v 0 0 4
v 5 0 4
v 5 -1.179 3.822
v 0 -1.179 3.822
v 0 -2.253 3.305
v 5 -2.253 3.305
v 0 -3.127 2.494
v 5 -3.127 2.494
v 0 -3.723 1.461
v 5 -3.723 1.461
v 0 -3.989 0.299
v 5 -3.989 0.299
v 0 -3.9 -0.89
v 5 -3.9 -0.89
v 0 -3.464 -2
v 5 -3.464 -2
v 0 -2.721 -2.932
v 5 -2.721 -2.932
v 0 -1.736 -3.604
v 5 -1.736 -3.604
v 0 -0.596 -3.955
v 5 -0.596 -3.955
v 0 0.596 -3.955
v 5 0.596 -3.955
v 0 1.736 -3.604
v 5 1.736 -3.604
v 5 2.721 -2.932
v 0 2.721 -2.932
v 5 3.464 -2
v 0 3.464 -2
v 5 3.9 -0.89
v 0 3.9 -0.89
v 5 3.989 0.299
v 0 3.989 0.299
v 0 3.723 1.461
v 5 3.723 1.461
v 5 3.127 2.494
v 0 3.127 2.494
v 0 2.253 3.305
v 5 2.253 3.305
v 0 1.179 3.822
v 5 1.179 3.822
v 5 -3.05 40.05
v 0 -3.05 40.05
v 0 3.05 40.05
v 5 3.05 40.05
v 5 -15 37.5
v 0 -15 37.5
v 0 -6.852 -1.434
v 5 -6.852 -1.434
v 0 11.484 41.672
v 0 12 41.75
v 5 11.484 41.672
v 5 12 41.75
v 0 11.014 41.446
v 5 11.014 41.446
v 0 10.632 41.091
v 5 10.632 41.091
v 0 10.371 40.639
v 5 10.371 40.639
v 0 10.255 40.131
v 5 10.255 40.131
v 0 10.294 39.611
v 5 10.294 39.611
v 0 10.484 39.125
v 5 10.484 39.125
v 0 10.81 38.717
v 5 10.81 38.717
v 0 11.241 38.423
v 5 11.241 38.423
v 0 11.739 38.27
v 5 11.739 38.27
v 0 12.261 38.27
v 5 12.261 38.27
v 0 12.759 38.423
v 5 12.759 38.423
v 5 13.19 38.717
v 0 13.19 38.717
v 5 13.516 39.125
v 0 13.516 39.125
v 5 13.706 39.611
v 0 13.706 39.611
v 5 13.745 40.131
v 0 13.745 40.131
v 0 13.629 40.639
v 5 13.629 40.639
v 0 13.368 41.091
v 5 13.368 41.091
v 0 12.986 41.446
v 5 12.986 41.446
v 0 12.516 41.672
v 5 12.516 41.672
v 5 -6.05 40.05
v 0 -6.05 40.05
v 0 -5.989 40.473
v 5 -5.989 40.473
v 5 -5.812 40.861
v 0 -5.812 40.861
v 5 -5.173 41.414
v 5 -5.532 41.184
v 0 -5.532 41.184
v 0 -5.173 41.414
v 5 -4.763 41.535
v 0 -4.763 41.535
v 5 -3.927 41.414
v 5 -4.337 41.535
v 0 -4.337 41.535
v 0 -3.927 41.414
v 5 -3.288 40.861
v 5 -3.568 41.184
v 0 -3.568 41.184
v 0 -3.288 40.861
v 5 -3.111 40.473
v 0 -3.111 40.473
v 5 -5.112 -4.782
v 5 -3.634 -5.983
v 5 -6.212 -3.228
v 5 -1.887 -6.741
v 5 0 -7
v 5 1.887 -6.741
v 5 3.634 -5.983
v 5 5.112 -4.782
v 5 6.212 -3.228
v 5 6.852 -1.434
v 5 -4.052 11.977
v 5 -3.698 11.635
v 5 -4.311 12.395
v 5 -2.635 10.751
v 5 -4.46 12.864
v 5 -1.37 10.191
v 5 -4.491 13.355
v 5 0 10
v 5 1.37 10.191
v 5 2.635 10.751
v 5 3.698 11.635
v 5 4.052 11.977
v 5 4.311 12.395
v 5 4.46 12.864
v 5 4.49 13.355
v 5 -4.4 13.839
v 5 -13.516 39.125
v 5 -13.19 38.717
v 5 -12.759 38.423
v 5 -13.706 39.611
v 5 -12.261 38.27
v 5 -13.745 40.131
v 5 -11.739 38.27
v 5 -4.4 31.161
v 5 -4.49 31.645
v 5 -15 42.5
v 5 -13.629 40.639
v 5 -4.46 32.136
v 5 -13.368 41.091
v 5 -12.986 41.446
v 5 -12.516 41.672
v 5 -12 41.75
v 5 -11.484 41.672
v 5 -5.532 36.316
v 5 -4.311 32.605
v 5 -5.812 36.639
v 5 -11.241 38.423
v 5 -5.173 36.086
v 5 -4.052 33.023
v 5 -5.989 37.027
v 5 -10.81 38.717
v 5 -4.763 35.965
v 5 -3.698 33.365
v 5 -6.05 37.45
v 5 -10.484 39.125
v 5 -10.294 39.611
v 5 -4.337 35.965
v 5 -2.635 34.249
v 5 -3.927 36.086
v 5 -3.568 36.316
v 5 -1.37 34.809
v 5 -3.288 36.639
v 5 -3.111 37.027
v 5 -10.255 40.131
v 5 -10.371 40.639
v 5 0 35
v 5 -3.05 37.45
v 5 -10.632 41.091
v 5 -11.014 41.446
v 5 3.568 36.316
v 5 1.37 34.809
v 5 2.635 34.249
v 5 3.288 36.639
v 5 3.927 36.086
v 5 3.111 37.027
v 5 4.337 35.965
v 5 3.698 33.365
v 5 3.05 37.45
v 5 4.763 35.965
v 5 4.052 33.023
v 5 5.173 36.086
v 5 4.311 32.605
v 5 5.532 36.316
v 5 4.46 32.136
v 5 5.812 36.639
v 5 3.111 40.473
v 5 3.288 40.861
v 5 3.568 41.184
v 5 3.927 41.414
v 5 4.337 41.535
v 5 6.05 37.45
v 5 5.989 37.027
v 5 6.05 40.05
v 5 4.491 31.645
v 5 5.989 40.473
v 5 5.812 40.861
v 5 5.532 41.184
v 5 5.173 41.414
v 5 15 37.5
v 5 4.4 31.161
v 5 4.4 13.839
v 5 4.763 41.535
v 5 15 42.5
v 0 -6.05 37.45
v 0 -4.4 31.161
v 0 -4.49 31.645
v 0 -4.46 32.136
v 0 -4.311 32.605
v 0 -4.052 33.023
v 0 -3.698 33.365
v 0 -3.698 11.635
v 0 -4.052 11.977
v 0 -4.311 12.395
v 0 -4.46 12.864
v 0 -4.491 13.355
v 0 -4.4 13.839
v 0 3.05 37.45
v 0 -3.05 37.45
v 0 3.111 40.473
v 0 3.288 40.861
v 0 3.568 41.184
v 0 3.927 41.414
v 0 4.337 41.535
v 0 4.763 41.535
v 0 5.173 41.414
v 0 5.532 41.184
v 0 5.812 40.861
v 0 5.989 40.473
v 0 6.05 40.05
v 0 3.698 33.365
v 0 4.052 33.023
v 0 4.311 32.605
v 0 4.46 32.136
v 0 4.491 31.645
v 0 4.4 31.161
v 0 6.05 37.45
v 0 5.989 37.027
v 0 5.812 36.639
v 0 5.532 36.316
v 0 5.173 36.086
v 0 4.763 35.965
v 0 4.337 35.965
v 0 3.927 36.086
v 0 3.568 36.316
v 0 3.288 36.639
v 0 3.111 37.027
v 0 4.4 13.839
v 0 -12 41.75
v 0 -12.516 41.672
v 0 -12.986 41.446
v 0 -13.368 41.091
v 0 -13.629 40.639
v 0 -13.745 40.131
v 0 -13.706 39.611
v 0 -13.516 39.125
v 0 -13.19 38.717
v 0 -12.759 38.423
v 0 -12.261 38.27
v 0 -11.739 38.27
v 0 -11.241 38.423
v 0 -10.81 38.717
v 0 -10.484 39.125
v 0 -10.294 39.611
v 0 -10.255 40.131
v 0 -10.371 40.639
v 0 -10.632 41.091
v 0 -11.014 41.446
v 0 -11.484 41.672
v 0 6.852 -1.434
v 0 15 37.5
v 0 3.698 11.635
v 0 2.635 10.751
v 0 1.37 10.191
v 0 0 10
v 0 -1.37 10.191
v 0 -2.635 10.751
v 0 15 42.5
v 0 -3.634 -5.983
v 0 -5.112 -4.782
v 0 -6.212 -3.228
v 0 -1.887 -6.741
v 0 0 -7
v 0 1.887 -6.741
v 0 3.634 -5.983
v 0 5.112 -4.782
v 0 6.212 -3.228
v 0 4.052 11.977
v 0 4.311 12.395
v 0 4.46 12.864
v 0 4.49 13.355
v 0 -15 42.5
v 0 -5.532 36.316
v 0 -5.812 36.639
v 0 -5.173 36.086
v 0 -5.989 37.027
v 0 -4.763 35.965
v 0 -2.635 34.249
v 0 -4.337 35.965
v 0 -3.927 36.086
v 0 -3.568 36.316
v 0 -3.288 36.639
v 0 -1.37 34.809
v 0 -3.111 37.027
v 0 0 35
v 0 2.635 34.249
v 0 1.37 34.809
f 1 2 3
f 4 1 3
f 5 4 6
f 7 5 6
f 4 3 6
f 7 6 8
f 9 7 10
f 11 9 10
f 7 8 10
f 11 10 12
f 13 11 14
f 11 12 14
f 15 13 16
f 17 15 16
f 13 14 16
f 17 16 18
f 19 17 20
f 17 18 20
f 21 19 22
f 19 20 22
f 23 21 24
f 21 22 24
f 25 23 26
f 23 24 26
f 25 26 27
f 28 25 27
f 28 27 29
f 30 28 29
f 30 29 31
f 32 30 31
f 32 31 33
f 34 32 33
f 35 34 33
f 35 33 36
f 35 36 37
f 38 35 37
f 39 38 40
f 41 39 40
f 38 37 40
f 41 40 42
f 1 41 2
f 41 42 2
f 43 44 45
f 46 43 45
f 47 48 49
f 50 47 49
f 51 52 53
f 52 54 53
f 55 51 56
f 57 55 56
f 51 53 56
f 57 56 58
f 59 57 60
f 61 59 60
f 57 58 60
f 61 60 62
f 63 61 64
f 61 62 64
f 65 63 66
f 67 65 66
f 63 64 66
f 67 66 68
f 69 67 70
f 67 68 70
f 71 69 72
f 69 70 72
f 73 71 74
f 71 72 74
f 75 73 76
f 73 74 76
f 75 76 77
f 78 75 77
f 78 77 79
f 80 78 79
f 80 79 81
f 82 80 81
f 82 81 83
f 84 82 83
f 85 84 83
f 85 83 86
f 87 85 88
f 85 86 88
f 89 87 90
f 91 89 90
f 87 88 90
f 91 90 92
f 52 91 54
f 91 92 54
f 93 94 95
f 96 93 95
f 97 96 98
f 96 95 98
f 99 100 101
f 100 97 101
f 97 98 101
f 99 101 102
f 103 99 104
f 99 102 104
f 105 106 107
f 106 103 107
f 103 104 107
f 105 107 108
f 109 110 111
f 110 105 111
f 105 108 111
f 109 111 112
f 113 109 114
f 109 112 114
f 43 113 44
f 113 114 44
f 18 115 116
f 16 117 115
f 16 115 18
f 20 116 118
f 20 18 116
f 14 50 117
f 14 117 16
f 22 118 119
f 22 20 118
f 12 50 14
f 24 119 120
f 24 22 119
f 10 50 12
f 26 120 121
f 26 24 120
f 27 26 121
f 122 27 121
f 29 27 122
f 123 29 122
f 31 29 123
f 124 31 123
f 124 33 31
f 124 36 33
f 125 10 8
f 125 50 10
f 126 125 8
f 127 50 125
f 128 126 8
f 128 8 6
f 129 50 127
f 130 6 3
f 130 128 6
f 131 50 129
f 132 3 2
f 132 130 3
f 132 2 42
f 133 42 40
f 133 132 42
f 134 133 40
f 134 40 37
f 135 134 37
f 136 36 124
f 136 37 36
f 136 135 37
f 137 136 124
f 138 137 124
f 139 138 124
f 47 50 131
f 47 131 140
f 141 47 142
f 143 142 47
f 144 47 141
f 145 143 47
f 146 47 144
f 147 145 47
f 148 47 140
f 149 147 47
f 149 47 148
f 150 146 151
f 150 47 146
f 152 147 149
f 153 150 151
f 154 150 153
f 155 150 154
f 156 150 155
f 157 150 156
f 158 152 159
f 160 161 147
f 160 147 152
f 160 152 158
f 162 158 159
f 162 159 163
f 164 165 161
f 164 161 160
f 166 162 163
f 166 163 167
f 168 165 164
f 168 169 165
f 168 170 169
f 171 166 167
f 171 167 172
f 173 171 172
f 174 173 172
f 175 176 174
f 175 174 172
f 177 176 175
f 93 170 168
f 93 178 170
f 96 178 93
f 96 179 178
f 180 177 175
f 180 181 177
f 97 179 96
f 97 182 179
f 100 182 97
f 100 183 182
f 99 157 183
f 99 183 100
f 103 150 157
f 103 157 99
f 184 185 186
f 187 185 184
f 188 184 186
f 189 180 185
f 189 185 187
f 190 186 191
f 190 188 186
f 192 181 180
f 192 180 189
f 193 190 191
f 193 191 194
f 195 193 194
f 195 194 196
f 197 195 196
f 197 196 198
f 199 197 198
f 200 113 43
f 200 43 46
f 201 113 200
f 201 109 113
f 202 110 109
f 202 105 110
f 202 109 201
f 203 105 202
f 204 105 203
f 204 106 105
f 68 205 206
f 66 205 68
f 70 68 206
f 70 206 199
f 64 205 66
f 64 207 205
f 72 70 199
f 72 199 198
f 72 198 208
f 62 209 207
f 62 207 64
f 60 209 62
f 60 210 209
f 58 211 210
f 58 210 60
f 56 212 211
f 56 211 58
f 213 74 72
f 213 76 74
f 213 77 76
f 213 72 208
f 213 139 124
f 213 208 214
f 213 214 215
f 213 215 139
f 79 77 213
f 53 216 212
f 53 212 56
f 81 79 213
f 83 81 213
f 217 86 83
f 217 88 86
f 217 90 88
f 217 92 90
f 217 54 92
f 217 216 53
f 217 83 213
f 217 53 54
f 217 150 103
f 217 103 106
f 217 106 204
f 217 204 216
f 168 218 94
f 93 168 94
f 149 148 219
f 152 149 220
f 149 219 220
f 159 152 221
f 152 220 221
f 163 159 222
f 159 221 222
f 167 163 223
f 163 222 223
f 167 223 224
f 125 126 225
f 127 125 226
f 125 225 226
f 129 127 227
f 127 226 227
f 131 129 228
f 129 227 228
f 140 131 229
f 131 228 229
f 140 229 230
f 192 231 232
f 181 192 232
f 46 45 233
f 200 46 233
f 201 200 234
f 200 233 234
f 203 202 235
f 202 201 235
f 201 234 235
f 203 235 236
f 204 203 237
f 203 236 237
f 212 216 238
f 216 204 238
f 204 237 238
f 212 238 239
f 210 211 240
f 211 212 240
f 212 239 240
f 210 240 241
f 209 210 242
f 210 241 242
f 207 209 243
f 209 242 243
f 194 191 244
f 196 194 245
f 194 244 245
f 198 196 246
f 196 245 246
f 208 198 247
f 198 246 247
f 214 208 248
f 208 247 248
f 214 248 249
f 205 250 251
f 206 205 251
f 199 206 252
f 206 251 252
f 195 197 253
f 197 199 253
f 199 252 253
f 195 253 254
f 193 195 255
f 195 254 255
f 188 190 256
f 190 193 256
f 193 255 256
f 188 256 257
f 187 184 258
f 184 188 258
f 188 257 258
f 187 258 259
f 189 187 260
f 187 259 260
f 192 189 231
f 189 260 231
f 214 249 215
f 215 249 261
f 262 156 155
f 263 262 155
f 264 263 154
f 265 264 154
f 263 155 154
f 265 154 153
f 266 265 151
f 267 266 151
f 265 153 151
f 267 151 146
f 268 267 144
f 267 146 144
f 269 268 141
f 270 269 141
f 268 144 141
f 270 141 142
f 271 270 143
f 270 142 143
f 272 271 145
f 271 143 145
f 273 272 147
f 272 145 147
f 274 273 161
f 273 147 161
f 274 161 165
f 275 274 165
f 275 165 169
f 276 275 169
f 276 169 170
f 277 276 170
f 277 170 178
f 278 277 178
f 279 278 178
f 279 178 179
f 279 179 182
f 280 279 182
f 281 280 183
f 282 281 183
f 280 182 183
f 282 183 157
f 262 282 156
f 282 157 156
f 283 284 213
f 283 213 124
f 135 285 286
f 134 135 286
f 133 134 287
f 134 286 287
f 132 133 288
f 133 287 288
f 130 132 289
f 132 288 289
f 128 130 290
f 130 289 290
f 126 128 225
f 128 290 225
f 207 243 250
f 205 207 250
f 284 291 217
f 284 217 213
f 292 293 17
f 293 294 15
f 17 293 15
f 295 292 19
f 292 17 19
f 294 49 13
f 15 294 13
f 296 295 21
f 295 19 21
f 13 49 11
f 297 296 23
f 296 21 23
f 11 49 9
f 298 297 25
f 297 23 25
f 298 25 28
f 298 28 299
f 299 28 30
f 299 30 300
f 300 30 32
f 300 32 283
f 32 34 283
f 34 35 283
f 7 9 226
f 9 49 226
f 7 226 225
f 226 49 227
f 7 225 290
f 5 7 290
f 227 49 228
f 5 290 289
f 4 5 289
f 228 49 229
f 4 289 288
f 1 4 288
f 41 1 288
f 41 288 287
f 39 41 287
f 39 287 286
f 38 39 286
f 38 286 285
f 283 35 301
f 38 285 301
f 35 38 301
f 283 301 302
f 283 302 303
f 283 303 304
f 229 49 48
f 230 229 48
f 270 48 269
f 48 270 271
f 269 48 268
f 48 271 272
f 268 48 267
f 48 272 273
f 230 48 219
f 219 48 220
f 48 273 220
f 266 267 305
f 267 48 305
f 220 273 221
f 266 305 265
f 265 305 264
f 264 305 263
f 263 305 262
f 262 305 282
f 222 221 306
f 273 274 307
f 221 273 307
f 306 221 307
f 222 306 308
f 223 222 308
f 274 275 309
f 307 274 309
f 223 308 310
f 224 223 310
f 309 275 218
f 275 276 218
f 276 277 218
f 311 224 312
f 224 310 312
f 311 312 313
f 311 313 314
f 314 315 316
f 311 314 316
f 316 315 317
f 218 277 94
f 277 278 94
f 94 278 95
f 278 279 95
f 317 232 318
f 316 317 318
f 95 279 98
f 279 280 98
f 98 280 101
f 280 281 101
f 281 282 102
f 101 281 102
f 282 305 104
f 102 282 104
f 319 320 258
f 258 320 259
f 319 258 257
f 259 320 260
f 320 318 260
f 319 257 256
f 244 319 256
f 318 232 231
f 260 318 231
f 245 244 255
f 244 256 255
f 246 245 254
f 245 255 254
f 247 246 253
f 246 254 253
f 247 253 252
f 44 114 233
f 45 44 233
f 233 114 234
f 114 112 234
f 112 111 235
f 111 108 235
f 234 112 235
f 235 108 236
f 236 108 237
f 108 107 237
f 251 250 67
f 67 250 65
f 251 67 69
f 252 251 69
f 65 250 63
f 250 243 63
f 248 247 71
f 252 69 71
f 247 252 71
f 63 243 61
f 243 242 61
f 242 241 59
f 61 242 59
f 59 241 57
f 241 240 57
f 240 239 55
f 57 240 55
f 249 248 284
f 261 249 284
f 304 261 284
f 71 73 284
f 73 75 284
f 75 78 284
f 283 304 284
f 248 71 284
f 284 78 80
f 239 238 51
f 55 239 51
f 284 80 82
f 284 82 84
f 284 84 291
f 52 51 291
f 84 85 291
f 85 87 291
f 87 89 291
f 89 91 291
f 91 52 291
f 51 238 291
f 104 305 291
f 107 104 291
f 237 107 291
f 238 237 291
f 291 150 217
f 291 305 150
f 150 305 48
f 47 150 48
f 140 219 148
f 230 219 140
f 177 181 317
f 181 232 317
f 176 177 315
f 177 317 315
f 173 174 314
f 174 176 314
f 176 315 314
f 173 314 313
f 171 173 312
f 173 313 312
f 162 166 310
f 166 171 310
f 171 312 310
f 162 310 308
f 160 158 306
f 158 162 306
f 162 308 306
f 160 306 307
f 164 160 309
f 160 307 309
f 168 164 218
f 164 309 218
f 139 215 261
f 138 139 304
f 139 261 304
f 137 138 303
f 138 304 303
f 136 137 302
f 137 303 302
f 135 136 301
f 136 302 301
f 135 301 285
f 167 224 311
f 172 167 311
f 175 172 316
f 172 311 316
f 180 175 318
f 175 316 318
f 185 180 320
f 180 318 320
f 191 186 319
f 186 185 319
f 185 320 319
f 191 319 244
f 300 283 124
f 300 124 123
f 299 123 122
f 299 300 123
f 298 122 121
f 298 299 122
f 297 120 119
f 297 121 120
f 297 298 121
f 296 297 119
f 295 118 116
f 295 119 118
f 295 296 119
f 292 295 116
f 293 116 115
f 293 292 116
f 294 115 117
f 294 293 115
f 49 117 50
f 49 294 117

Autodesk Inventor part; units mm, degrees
ref_plane "YZ Plane" through (0, 0, 0) normal (1, 0, 0) x (0, 1, 0)
ref_plane "XZ Plane" through (0, 0, 0) normal (0, 1, 0) x (-1, 0, 0)
ref_plane "XY Plane" through (0, 0, 0) normal (0, 0, 1) x (1, 0, 0)
sketch "Sketch1" plane through (0, 0, 0) normal (1, 0, 0) x (0, 1, 0)
  line L0 (-15, 42.5) -> (15, 42.5)
  line L1 (15, 42.5) -> (15, 37.5)
  line L2 (15, 37.5) -> (6.8516, -1.434)
  arc A0 (-6.8516, -1.434) -> (6.8516, -1.434) centre (0, 0) ccw
  line L3 (0, 0) -> (0, 42.5) construction
  line L4 (-15, 42.5) -> (-15, 37.5)
  line L5 (-15, 37.5) -> (-6.8516, -1.434)
  line L6 (-15, 40) -> (15, 40) construction
  arc A1 (4.4, 32.3749) -> (-4.4, 32.3749) centre (0, 30) ccw
  line L7 (-4.4, 32.3749) -> (-4.4, 12.6251)
  line L8 (-4.4, 22.5) -> (4.4, 22.5) construction
  line L9 (4.4, 32.3749) -> (4.4, 12.6251)
  arc A2 (-4.4, 12.6251) -> (4.4, 12.6251) centre (0, 15) ccw
  circle A3 centre (0, 15) radius 15 construction
  line L10 (0, 0) -> (12.9904, 7.5) construction
  line L11 (12.9904, 7.5) -> (25.9808, 15) construction
  line L12 (6, 37.5) -> (-6, 37.5) construction
  line L13 (-6, 37.5) -> (-6, 40) construction
  line L14 (-6, 40) -> (6, 40) construction
  line L15 (6, 40) -> (6, 37.5) construction
  line L16 (6, 37.5) -> (-6, 40) construction
  line L17 (-6, 37.5) -> (6, 40) construction
  arc A4 (4.4, 31.1611) -> (3.6981, 33.3651) centre (2.4943, 31.768) ccw
  arc A5 (-3.6981, 33.3651) -> (-4.4, 31.1611) centre (-2.4943, 31.768) ccw
  arc A6 (3.6981, 11.6349) -> (4.4, 13.8389) centre (2.4943, 13.232) ccw
  arc A7 (-4.4, 13.8389) -> (-3.6981, 11.6349) centre (-2.4943, 13.232) ccw
  circle A8 centre (0, 0) radius 4 construction
  line L18 (6.05, 37.45) -> (-6.05, 37.45)
  line L19 (-6.05, 37.45) -> (-6.05, 40.05)
  line L20 (-6.05, 40.05) -> (6.05, 40.05)
  line L21 (6.05, 40.05) -> (6.05, 37.45)
  line L22 (6.05, 37.45) -> (-6.05, 40.05) construction
  line L23 (-6.05, 37.45) -> (6.05, 40.05) construction
  line L24 (-6.05, 38.75) -> (6.05, 38.75)
  arc A9 (6.05, 40.05) -> (3.05, 40.05) centre (4.55, 40.05) ccw
  arc A10 (3.05, 37.45) -> (6.05, 37.45) centre (4.55, 37.45) ccw
  arc A11 (-3.05, 40.05) -> (-6.05, 40.05) centre (-4.55, 40.05) ccw
  arc A12 (-6.05, 37.45) -> (-3.05, 37.45) centre (-4.55, 37.45) ccw
  circle A13 centre (0, 0) radius 30 construction
  point P0 (-12, 40)
  point P1 (12, 40)
  point P2 (0, 38.75)
  point P3 (-3.6981, 11.6349)
  point P4 (-4.4, 13.8389)
  point P5 (-4.4, 31.1611)
  point P6 (-3.6981, 33.3651)
  point P7 (4.4, 13.8389)
  point P8 (3.6981, 11.6349)
  point P9 (-3.05, 37.45)
  point P10 (-3.05, 40.05)
  point P11 (3.05, 37.45)
  dimension "d0" = 14
  dimension "d1" = 5
  dimension "d3" = 30
  dimension "d4" = 5
  dimension "d5" = 8.8
  dimension "d6" = 15
  dimension "d7" = 60
  dimension "d8" = 15
  dimension "d11" = 24
  dimension "d12" = 12
  dimension "d14" = 2
  dimension "d31" = 8
  dimension "d34" = 1.5
  dimension "d35" = 0.05
  dimension "d36" = 0.05
  dimension "d37" = 5
  dimension "d38" = 2.5
  dimension "d42" = 15
  dimension "d43" = 2.5
extrude "Extrusion1" add sketch "Sketch1" along normal blind 5
hole "Hole1" at (0, -12, 40) at (0, 12, 40) direction (1, 0, 0) diameter 3.5 end through all
hole "Hole2" at (0, 0, 0) direction (1, 0, 0) diameter 8 end through all
equation "\"d36\" = d35"
equation "\"d42\" = d8"
equation "\"d24\" = d31"
properties part number "LegRollSliderFrame" material "Aluminum 7075"
